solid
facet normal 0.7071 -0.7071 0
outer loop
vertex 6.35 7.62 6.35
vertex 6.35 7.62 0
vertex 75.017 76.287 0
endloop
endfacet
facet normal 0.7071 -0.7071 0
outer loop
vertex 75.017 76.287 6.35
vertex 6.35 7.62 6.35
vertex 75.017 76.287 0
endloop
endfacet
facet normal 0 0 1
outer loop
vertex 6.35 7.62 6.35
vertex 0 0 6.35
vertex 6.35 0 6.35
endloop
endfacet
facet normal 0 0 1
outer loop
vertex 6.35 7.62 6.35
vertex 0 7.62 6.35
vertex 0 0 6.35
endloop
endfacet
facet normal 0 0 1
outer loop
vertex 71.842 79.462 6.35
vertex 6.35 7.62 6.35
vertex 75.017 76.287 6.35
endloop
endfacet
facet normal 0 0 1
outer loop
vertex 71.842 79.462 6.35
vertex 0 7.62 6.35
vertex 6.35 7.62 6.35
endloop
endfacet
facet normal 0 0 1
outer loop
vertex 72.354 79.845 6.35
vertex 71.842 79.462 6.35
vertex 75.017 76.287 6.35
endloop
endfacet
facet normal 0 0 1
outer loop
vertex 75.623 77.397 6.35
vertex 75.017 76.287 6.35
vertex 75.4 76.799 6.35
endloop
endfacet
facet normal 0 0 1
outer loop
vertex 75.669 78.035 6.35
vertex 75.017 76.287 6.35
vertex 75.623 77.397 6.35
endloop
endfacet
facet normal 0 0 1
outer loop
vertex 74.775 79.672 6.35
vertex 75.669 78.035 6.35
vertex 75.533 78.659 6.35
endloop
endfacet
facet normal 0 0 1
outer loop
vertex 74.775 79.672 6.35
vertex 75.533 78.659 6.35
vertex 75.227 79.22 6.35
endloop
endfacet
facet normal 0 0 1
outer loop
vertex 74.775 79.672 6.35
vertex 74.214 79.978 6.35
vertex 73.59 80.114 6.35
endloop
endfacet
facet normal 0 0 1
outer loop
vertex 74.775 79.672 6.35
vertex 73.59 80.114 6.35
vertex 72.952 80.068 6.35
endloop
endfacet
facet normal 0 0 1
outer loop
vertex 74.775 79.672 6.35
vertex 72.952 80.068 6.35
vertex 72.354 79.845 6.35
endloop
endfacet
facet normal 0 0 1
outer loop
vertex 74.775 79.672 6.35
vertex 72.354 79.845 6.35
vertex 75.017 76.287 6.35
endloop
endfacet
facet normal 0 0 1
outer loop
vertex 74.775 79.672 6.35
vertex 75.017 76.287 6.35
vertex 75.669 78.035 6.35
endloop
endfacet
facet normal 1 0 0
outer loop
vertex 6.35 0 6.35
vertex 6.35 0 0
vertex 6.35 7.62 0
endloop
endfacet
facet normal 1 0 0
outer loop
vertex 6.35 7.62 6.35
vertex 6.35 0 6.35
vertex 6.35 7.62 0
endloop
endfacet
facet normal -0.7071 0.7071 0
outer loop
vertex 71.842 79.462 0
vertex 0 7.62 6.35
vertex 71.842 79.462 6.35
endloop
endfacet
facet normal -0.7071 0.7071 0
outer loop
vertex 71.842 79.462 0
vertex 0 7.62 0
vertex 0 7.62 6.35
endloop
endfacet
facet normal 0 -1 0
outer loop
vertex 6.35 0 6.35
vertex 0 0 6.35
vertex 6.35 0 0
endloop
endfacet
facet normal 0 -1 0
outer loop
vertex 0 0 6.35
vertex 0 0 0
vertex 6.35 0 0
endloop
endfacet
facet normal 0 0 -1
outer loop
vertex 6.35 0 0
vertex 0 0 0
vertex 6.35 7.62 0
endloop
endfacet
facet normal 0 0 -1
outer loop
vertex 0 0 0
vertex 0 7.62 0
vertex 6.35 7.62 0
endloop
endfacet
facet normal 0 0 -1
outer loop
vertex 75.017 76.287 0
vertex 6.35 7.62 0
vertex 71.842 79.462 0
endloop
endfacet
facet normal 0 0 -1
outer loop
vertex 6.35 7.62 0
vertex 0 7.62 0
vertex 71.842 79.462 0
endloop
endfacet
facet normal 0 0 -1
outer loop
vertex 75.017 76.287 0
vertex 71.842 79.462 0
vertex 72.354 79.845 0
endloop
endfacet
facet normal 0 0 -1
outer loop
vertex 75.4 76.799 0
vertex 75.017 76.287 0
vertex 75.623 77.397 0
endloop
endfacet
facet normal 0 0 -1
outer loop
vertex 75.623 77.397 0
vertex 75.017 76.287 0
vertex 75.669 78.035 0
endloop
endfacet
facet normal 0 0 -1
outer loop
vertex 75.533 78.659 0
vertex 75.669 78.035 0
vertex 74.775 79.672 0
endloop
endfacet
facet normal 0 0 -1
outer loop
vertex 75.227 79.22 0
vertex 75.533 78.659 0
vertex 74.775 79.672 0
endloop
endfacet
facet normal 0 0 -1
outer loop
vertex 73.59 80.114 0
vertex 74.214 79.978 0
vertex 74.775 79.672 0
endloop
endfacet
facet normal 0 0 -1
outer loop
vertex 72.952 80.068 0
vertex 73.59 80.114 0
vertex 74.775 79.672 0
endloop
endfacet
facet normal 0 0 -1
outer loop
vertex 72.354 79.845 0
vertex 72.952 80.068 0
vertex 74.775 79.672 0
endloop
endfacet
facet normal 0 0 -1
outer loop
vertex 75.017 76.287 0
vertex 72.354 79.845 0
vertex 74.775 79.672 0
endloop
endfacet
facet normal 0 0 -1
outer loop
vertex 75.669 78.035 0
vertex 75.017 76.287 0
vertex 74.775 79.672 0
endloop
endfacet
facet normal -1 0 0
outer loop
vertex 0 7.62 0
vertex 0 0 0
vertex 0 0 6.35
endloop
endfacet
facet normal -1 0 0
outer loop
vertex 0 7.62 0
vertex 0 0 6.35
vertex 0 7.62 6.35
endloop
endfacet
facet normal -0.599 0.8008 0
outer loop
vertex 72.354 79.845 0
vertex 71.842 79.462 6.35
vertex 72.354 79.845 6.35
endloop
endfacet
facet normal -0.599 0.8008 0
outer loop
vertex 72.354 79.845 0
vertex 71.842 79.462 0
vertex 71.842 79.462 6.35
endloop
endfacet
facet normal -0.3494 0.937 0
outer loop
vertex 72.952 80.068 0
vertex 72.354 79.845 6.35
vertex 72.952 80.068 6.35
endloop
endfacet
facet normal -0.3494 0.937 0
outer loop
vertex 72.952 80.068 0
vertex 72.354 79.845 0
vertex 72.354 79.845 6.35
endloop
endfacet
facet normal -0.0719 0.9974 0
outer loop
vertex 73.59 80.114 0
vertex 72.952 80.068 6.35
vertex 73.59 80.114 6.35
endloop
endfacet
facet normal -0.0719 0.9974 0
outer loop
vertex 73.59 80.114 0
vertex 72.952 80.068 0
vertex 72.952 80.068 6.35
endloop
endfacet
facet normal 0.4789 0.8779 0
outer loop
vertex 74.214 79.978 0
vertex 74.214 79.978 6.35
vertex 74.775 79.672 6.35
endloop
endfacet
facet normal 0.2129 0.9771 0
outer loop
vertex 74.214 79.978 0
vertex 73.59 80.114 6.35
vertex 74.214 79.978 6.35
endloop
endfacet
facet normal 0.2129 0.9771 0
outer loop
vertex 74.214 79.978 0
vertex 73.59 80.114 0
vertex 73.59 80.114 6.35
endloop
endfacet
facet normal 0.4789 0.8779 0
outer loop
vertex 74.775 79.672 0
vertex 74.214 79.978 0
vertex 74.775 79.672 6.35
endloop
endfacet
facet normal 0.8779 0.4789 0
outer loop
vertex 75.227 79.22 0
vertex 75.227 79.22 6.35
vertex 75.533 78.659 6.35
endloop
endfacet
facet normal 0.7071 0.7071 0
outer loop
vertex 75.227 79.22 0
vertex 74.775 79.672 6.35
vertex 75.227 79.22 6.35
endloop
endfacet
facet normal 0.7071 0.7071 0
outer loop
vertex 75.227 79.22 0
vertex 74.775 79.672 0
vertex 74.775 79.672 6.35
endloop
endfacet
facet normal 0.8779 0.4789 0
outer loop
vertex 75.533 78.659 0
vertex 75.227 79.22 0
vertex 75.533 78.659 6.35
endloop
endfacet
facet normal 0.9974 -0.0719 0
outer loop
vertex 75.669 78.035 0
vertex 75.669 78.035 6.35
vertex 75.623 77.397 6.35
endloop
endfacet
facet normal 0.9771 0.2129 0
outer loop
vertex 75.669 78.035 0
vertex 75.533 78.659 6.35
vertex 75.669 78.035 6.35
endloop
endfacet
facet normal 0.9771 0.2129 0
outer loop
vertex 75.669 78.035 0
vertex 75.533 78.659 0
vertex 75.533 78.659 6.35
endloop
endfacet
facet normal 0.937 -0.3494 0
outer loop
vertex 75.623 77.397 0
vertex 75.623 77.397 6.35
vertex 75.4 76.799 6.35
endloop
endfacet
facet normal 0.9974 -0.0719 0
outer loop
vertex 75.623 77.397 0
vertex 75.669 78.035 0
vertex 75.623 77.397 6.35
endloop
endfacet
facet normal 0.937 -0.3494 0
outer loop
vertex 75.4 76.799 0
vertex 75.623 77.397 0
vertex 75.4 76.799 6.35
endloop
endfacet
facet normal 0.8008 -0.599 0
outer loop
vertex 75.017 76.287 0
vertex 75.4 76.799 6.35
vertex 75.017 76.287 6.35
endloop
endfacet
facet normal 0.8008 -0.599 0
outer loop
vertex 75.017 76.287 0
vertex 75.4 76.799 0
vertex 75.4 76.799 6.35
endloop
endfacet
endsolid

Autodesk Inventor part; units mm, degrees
ref_plane "YZ Plane" through (0, 0, 0) normal (1, 0, 0) x (0, 1, 0)
ref_plane "XZ Plane" through (0, 0, 0) normal (0, 1, 0) x (-1, 0, 0)
ref_plane "XY Plane" through (0, 0, 0) normal (0, 0, 1) x (1, 0, 0)
sketch "Sketch1" plane through (0, 0, 0) normal (0, 0, 1) x (1, 0, 0)
  line L0 (0, 0) -> (0, 7.62)
  line L1 (0, 0) -> (6.35, 0)
  line L2 (0, 7.62) -> (73.3235, 7.62) construction
  line L3 (6.35, 0) -> (6.35, 7.62)
  line L4 (6.35, 7.62) -> (13.3564, 7.62) construction
  line L5 (0, 7.62) -> (71.842, 79.462)
  line L6 (6.35, 7.62) -> (75.017, 76.287)
  arc A0 (75.017, 76.287) -> (71.842, 79.462) centre (73.4295, 77.8745) ccw
  dimension "d0" = 7.62
  dimension "d1" = 6.35
  dimension "d8" = 7.62
  dimension "d27" = 101.6
  dimension "d28" = 45
extrude "Extrusion4" add sketch "Sketch1" along normal blind 6.35
properties part number "Funneling_v1"
